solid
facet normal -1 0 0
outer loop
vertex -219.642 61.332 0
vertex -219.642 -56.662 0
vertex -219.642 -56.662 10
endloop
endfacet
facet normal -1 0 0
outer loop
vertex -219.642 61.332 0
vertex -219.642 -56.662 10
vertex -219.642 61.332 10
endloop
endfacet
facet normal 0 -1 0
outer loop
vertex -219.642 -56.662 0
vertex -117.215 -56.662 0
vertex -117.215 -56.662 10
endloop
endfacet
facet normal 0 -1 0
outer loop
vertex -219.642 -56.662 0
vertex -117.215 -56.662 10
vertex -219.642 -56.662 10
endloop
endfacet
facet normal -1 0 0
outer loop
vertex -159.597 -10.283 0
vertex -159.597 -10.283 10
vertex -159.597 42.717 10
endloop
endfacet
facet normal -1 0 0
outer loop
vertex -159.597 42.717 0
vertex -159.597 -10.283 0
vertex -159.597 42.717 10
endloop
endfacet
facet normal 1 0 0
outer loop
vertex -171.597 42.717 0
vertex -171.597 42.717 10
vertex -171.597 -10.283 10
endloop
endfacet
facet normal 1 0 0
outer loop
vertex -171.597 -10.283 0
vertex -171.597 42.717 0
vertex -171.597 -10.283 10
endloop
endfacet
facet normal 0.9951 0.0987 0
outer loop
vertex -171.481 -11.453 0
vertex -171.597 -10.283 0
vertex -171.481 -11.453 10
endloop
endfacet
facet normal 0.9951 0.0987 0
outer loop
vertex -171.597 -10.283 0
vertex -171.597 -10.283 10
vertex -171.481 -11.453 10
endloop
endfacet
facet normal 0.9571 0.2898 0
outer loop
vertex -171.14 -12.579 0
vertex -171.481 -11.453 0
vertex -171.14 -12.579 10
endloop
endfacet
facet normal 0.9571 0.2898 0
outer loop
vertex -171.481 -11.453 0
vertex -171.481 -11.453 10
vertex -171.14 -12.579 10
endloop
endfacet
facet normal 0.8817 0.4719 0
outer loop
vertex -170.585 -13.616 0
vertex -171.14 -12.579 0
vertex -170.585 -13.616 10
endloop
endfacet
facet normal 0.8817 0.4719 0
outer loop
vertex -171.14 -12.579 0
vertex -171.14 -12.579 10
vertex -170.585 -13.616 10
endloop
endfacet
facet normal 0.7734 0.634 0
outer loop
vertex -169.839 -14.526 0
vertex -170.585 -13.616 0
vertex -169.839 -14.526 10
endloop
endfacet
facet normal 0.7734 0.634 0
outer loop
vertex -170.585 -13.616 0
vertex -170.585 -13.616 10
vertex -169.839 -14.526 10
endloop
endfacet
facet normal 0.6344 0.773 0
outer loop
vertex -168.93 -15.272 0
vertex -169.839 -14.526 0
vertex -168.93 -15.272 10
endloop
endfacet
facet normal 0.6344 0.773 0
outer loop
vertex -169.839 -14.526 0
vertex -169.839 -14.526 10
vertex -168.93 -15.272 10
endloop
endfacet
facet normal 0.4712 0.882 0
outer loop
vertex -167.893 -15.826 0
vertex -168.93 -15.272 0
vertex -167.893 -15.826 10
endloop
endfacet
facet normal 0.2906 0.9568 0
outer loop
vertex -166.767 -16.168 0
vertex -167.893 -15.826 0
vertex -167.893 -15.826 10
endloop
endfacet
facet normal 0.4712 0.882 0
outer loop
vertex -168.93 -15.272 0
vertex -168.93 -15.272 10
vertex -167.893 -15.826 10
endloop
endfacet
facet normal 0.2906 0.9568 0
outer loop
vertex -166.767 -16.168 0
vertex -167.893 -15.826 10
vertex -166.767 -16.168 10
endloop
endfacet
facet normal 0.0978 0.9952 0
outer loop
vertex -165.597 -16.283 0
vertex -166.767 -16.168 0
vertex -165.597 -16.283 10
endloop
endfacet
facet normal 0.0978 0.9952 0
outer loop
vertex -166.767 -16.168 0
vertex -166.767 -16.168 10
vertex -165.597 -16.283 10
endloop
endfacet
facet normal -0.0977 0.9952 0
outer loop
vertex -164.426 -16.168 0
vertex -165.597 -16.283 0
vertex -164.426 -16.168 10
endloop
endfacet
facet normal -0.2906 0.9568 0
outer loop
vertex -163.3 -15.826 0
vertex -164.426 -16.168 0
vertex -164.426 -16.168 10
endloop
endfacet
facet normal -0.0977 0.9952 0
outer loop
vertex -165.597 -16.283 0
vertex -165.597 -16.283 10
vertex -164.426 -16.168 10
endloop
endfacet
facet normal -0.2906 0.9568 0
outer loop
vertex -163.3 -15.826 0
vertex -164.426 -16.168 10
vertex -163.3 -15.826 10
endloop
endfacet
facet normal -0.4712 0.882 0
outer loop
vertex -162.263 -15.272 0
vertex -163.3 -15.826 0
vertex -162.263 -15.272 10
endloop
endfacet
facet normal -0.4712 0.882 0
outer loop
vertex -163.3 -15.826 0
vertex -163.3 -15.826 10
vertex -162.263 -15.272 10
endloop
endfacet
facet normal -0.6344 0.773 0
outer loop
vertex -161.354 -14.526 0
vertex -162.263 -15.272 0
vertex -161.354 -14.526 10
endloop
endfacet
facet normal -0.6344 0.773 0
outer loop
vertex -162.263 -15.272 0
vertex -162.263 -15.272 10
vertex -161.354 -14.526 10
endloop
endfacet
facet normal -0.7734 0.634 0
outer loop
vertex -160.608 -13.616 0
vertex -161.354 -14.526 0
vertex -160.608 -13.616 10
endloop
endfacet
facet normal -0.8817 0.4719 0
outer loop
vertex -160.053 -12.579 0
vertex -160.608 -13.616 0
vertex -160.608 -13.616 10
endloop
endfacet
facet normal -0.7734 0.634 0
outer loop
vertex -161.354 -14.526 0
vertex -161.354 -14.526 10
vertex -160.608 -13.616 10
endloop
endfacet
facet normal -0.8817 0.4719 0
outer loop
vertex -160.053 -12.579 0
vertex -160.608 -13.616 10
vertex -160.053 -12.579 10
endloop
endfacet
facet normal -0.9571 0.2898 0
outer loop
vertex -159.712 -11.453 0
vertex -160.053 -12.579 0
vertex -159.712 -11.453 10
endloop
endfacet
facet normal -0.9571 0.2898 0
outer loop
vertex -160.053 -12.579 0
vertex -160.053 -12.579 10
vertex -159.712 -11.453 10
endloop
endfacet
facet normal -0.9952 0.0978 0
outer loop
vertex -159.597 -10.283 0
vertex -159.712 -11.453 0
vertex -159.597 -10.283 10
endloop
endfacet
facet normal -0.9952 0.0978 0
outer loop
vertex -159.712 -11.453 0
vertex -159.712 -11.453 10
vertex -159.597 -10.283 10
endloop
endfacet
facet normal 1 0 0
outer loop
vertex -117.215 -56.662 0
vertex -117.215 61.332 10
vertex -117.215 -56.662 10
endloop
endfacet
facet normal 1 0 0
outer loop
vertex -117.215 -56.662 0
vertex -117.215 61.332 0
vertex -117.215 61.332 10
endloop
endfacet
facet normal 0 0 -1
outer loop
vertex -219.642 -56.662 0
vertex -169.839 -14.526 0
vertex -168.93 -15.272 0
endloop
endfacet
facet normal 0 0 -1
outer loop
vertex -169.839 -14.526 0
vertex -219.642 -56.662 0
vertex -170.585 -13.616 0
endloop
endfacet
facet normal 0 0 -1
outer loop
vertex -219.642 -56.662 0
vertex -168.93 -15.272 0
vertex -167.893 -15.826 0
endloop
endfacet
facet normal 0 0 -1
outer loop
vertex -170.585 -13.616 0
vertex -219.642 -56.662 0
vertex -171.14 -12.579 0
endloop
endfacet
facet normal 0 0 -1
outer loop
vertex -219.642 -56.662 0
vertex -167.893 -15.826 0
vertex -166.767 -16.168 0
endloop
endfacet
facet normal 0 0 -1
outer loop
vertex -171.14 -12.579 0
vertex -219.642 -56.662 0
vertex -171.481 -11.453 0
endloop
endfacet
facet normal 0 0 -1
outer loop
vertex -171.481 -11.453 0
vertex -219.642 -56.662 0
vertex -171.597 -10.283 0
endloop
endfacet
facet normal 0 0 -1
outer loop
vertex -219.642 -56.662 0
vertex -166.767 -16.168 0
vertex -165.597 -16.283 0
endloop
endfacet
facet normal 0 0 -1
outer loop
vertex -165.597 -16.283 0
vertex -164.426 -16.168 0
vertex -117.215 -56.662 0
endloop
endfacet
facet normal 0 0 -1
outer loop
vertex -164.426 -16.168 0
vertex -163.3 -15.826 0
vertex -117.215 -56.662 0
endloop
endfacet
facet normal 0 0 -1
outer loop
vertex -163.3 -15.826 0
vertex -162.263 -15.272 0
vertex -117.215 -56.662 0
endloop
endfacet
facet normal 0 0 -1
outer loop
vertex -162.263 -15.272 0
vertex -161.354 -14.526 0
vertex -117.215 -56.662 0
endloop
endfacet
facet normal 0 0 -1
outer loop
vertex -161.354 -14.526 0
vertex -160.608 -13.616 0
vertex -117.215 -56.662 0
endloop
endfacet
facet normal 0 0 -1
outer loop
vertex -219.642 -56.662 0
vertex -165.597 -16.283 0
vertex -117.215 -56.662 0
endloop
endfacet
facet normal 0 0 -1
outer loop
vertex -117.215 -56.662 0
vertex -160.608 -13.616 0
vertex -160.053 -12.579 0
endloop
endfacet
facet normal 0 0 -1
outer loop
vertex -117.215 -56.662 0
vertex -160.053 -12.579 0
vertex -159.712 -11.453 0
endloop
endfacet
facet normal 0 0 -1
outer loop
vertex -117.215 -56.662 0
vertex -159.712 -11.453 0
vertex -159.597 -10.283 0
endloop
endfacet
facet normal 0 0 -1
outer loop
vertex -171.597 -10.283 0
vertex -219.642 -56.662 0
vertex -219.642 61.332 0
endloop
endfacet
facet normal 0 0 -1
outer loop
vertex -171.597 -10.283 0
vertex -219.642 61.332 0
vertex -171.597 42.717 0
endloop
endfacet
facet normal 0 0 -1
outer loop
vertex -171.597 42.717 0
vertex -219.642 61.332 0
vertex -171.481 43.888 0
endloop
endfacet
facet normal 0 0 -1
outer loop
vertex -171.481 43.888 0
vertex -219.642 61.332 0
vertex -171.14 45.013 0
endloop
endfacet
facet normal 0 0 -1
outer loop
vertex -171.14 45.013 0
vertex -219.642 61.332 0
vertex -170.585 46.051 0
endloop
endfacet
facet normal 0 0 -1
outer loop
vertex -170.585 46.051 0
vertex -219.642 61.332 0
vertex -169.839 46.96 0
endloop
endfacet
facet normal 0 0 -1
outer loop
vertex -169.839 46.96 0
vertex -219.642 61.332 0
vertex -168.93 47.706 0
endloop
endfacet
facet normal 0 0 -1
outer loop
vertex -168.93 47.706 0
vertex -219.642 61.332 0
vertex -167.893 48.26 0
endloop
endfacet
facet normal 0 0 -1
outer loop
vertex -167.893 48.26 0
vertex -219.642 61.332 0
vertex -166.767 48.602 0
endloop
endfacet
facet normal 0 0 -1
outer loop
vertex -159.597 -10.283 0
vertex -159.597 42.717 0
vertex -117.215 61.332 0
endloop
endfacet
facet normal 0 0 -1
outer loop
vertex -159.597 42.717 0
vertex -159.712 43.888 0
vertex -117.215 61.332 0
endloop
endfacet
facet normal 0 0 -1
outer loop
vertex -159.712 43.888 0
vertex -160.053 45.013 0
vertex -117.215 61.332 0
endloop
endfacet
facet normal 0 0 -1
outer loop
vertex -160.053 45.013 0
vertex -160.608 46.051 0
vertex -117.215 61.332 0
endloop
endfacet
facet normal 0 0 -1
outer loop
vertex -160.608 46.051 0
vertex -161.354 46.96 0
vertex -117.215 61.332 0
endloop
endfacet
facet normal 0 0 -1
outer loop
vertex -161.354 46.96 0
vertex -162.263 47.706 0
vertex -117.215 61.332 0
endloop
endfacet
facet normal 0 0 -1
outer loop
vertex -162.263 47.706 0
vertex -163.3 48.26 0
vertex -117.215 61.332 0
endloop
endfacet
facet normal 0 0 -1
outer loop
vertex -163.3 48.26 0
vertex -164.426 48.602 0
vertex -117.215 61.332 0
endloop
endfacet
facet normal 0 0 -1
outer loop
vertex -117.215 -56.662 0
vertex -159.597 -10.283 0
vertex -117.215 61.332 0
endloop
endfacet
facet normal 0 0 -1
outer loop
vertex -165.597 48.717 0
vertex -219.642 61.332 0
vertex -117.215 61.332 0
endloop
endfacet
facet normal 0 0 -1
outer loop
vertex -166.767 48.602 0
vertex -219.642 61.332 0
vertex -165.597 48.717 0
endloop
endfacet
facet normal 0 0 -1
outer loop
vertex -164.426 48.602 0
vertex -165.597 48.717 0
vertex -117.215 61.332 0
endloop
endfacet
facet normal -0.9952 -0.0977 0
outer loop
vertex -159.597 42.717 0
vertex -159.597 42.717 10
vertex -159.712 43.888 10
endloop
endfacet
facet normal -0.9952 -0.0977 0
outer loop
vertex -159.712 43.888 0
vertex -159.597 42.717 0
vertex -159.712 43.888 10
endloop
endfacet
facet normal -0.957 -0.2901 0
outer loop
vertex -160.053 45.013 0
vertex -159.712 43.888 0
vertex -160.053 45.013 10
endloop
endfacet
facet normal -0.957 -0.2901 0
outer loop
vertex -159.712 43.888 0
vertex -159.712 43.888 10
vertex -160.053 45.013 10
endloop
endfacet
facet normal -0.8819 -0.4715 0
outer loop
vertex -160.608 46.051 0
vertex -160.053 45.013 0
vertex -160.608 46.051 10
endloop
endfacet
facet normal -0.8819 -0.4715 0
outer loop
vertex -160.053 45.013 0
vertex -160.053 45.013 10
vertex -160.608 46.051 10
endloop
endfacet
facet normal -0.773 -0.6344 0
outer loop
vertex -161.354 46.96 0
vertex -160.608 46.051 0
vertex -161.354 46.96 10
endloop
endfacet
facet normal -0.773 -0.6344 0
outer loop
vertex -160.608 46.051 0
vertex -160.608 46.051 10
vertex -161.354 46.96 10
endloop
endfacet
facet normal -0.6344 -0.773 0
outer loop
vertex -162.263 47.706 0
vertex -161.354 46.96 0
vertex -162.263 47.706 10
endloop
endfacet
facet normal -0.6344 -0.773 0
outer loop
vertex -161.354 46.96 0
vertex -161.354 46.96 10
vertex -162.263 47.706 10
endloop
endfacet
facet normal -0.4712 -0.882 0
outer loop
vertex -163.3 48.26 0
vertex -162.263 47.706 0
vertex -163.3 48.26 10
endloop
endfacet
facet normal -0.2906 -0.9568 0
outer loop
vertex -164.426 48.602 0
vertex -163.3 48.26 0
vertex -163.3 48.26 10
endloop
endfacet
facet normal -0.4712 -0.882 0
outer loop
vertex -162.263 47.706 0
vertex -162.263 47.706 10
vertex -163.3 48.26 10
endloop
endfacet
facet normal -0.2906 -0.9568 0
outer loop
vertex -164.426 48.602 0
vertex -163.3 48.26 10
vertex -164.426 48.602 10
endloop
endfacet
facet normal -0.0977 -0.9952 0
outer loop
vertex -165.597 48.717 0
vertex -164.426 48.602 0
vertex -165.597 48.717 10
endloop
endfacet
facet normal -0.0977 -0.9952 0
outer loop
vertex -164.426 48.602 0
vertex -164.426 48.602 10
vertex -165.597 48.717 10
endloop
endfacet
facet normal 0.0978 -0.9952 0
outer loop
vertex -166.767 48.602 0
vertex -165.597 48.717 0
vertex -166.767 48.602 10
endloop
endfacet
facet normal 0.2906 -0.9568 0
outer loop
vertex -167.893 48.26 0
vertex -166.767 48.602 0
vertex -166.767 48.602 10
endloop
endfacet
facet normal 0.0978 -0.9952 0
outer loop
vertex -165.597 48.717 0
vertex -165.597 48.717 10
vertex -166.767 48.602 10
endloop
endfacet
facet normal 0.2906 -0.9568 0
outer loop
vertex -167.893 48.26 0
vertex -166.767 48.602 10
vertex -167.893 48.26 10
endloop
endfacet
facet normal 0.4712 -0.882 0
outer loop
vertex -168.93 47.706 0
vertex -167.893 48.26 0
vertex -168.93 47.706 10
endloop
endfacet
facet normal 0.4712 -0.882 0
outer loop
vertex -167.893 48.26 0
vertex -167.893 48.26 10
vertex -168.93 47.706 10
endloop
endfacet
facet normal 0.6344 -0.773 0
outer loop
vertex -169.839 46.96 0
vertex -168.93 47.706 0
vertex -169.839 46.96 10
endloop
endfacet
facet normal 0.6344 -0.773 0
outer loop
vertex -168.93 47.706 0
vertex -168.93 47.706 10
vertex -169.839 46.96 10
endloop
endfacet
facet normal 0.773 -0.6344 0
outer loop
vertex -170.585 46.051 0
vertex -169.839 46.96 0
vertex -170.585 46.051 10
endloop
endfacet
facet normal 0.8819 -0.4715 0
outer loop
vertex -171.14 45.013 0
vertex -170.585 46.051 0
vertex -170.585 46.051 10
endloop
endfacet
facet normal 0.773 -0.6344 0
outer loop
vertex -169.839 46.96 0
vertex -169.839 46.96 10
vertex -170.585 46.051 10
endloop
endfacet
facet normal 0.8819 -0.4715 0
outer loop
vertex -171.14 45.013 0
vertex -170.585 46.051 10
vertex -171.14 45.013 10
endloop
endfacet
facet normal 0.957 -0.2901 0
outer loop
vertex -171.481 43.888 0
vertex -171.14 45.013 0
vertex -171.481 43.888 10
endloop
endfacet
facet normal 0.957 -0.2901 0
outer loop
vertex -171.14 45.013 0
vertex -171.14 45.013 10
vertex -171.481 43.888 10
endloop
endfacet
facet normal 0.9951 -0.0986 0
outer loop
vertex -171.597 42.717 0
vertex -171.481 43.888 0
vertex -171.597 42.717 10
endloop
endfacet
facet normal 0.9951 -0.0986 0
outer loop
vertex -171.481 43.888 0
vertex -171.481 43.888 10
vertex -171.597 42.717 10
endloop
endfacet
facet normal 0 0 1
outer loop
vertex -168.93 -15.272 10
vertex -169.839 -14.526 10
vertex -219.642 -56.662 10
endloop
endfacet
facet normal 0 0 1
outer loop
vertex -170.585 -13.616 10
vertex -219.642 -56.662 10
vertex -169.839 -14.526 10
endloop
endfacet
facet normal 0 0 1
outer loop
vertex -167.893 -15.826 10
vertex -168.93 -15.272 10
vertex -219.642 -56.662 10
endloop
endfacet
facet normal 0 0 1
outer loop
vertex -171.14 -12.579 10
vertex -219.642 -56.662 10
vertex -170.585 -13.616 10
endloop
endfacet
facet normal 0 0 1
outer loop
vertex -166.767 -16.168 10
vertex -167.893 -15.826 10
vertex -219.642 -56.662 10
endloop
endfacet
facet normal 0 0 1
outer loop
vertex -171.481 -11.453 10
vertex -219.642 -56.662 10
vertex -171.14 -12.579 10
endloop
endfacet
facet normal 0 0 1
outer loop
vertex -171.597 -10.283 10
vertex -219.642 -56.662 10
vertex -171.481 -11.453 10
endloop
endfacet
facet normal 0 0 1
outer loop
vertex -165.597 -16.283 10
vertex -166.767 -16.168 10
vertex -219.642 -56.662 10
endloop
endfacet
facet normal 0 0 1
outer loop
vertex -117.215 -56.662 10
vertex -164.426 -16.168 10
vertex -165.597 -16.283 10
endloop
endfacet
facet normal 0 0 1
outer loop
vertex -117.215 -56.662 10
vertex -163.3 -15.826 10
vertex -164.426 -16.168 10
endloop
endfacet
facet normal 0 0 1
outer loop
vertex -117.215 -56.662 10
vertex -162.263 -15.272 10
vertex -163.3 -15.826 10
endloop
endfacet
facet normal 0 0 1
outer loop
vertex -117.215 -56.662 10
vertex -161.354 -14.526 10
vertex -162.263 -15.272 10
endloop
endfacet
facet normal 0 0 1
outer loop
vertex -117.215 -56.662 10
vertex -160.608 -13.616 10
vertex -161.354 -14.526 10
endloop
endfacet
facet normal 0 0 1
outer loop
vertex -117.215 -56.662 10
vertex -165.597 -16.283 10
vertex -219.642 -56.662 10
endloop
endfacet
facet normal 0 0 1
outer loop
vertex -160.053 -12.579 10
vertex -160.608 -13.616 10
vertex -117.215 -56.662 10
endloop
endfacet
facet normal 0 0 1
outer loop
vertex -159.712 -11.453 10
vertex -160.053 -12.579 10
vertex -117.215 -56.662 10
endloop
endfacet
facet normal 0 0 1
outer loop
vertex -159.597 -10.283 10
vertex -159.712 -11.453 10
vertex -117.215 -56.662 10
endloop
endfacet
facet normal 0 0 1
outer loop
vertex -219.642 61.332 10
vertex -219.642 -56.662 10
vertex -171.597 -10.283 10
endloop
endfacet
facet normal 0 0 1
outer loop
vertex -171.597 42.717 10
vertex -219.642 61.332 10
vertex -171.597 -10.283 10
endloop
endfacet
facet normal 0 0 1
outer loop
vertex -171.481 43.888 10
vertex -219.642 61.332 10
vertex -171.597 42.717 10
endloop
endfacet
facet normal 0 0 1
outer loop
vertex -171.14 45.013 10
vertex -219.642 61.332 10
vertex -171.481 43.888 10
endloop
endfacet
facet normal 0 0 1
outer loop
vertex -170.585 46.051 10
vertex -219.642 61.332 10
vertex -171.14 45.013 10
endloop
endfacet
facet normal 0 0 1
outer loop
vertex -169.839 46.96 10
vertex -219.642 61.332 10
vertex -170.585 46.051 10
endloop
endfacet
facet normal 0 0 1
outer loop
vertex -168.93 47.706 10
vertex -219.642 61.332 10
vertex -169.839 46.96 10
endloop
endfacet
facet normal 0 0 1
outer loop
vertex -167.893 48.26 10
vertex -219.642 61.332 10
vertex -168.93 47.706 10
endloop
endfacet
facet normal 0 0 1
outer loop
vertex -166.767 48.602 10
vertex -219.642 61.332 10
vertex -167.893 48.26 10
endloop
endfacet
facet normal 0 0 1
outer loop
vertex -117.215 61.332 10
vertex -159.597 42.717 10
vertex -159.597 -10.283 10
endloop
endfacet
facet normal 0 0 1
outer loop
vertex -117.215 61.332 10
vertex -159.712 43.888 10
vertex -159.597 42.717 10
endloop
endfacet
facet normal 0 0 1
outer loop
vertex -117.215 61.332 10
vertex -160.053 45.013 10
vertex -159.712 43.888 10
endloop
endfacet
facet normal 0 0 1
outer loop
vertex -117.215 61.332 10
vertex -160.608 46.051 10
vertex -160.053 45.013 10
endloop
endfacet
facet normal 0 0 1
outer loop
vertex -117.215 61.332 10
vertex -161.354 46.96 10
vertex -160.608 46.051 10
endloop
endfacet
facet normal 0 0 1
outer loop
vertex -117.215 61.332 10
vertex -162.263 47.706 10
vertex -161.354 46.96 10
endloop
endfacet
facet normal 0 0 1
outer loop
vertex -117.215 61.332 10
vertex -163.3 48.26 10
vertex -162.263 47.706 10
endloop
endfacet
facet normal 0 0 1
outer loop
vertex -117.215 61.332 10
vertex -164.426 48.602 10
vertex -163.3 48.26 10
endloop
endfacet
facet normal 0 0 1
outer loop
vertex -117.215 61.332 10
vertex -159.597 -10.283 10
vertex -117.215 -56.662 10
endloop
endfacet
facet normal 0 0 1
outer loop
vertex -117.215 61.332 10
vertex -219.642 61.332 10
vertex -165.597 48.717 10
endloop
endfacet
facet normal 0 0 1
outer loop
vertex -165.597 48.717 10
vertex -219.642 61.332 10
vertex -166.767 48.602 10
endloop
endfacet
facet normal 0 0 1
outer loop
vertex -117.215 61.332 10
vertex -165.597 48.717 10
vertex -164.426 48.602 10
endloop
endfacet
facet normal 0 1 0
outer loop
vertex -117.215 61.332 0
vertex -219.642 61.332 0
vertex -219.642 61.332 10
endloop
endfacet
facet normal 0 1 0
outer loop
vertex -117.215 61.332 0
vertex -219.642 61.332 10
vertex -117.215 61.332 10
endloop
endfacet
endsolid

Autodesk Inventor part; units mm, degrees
ref_plane "YZ Plane" through (0, 0, 0) normal (1, 0, 0) x (0, 1, 0)
ref_plane "XZ Plane" through (0, 0, 0) normal (0, 1, 0) x (-1, 0, 0)
ref_plane "XY Plane" through (0, 0, 0) normal (0, 0, 1) x (1, 0, 0)
sketch "Sketch1" plane through (0, 0, 0) normal (0, 0, 1) x (1, 0, 0)
  line L0 (-219.6419, 61.3316) -> (-117.215, 61.3316)
  line L1 (-117.215, 61.3316) -> (-117.215, -56.6617)
  line L2 (-117.215, -56.6617) -> (-219.6419, -56.6617)
  line L3 (-219.6419, -56.6617) -> (-219.6419, 61.3316)
  point P0 (0, 0)
extrude "Extrusion1" add sketch "Sketch1" along normal blind 10
sketch "Sketch2" plane through (0, 0, 10) normal (0, 0, 1) x (1, 0, 0)
  line L0 (-165.5966, 48.7171) -> (-165.5966, -16.2829) construction
  line L1 (-171.5966, 42.7171) -> (-171.5966, -10.2829)
  line L2 (-159.5966, -10.2829) -> (-159.5966, 42.7171)
  arc A0 (-159.5966, 42.7171) -> (-171.5966, 42.7171) centre (-165.5966, 42.7171) ccw
  arc A1 (-171.5966, -10.2829) -> (-159.5966, -10.2829) centre (-165.5966, -10.2829) ccw
  point P0 (0, 0)
  point P1 (-165.5966, 16.2171)
  dimension "d2" = 12
  dimension "d3" = 65
extrude "Extrusion2" cut sketch "Sketch2" against normal through all
properties part number "belt circufrence"
